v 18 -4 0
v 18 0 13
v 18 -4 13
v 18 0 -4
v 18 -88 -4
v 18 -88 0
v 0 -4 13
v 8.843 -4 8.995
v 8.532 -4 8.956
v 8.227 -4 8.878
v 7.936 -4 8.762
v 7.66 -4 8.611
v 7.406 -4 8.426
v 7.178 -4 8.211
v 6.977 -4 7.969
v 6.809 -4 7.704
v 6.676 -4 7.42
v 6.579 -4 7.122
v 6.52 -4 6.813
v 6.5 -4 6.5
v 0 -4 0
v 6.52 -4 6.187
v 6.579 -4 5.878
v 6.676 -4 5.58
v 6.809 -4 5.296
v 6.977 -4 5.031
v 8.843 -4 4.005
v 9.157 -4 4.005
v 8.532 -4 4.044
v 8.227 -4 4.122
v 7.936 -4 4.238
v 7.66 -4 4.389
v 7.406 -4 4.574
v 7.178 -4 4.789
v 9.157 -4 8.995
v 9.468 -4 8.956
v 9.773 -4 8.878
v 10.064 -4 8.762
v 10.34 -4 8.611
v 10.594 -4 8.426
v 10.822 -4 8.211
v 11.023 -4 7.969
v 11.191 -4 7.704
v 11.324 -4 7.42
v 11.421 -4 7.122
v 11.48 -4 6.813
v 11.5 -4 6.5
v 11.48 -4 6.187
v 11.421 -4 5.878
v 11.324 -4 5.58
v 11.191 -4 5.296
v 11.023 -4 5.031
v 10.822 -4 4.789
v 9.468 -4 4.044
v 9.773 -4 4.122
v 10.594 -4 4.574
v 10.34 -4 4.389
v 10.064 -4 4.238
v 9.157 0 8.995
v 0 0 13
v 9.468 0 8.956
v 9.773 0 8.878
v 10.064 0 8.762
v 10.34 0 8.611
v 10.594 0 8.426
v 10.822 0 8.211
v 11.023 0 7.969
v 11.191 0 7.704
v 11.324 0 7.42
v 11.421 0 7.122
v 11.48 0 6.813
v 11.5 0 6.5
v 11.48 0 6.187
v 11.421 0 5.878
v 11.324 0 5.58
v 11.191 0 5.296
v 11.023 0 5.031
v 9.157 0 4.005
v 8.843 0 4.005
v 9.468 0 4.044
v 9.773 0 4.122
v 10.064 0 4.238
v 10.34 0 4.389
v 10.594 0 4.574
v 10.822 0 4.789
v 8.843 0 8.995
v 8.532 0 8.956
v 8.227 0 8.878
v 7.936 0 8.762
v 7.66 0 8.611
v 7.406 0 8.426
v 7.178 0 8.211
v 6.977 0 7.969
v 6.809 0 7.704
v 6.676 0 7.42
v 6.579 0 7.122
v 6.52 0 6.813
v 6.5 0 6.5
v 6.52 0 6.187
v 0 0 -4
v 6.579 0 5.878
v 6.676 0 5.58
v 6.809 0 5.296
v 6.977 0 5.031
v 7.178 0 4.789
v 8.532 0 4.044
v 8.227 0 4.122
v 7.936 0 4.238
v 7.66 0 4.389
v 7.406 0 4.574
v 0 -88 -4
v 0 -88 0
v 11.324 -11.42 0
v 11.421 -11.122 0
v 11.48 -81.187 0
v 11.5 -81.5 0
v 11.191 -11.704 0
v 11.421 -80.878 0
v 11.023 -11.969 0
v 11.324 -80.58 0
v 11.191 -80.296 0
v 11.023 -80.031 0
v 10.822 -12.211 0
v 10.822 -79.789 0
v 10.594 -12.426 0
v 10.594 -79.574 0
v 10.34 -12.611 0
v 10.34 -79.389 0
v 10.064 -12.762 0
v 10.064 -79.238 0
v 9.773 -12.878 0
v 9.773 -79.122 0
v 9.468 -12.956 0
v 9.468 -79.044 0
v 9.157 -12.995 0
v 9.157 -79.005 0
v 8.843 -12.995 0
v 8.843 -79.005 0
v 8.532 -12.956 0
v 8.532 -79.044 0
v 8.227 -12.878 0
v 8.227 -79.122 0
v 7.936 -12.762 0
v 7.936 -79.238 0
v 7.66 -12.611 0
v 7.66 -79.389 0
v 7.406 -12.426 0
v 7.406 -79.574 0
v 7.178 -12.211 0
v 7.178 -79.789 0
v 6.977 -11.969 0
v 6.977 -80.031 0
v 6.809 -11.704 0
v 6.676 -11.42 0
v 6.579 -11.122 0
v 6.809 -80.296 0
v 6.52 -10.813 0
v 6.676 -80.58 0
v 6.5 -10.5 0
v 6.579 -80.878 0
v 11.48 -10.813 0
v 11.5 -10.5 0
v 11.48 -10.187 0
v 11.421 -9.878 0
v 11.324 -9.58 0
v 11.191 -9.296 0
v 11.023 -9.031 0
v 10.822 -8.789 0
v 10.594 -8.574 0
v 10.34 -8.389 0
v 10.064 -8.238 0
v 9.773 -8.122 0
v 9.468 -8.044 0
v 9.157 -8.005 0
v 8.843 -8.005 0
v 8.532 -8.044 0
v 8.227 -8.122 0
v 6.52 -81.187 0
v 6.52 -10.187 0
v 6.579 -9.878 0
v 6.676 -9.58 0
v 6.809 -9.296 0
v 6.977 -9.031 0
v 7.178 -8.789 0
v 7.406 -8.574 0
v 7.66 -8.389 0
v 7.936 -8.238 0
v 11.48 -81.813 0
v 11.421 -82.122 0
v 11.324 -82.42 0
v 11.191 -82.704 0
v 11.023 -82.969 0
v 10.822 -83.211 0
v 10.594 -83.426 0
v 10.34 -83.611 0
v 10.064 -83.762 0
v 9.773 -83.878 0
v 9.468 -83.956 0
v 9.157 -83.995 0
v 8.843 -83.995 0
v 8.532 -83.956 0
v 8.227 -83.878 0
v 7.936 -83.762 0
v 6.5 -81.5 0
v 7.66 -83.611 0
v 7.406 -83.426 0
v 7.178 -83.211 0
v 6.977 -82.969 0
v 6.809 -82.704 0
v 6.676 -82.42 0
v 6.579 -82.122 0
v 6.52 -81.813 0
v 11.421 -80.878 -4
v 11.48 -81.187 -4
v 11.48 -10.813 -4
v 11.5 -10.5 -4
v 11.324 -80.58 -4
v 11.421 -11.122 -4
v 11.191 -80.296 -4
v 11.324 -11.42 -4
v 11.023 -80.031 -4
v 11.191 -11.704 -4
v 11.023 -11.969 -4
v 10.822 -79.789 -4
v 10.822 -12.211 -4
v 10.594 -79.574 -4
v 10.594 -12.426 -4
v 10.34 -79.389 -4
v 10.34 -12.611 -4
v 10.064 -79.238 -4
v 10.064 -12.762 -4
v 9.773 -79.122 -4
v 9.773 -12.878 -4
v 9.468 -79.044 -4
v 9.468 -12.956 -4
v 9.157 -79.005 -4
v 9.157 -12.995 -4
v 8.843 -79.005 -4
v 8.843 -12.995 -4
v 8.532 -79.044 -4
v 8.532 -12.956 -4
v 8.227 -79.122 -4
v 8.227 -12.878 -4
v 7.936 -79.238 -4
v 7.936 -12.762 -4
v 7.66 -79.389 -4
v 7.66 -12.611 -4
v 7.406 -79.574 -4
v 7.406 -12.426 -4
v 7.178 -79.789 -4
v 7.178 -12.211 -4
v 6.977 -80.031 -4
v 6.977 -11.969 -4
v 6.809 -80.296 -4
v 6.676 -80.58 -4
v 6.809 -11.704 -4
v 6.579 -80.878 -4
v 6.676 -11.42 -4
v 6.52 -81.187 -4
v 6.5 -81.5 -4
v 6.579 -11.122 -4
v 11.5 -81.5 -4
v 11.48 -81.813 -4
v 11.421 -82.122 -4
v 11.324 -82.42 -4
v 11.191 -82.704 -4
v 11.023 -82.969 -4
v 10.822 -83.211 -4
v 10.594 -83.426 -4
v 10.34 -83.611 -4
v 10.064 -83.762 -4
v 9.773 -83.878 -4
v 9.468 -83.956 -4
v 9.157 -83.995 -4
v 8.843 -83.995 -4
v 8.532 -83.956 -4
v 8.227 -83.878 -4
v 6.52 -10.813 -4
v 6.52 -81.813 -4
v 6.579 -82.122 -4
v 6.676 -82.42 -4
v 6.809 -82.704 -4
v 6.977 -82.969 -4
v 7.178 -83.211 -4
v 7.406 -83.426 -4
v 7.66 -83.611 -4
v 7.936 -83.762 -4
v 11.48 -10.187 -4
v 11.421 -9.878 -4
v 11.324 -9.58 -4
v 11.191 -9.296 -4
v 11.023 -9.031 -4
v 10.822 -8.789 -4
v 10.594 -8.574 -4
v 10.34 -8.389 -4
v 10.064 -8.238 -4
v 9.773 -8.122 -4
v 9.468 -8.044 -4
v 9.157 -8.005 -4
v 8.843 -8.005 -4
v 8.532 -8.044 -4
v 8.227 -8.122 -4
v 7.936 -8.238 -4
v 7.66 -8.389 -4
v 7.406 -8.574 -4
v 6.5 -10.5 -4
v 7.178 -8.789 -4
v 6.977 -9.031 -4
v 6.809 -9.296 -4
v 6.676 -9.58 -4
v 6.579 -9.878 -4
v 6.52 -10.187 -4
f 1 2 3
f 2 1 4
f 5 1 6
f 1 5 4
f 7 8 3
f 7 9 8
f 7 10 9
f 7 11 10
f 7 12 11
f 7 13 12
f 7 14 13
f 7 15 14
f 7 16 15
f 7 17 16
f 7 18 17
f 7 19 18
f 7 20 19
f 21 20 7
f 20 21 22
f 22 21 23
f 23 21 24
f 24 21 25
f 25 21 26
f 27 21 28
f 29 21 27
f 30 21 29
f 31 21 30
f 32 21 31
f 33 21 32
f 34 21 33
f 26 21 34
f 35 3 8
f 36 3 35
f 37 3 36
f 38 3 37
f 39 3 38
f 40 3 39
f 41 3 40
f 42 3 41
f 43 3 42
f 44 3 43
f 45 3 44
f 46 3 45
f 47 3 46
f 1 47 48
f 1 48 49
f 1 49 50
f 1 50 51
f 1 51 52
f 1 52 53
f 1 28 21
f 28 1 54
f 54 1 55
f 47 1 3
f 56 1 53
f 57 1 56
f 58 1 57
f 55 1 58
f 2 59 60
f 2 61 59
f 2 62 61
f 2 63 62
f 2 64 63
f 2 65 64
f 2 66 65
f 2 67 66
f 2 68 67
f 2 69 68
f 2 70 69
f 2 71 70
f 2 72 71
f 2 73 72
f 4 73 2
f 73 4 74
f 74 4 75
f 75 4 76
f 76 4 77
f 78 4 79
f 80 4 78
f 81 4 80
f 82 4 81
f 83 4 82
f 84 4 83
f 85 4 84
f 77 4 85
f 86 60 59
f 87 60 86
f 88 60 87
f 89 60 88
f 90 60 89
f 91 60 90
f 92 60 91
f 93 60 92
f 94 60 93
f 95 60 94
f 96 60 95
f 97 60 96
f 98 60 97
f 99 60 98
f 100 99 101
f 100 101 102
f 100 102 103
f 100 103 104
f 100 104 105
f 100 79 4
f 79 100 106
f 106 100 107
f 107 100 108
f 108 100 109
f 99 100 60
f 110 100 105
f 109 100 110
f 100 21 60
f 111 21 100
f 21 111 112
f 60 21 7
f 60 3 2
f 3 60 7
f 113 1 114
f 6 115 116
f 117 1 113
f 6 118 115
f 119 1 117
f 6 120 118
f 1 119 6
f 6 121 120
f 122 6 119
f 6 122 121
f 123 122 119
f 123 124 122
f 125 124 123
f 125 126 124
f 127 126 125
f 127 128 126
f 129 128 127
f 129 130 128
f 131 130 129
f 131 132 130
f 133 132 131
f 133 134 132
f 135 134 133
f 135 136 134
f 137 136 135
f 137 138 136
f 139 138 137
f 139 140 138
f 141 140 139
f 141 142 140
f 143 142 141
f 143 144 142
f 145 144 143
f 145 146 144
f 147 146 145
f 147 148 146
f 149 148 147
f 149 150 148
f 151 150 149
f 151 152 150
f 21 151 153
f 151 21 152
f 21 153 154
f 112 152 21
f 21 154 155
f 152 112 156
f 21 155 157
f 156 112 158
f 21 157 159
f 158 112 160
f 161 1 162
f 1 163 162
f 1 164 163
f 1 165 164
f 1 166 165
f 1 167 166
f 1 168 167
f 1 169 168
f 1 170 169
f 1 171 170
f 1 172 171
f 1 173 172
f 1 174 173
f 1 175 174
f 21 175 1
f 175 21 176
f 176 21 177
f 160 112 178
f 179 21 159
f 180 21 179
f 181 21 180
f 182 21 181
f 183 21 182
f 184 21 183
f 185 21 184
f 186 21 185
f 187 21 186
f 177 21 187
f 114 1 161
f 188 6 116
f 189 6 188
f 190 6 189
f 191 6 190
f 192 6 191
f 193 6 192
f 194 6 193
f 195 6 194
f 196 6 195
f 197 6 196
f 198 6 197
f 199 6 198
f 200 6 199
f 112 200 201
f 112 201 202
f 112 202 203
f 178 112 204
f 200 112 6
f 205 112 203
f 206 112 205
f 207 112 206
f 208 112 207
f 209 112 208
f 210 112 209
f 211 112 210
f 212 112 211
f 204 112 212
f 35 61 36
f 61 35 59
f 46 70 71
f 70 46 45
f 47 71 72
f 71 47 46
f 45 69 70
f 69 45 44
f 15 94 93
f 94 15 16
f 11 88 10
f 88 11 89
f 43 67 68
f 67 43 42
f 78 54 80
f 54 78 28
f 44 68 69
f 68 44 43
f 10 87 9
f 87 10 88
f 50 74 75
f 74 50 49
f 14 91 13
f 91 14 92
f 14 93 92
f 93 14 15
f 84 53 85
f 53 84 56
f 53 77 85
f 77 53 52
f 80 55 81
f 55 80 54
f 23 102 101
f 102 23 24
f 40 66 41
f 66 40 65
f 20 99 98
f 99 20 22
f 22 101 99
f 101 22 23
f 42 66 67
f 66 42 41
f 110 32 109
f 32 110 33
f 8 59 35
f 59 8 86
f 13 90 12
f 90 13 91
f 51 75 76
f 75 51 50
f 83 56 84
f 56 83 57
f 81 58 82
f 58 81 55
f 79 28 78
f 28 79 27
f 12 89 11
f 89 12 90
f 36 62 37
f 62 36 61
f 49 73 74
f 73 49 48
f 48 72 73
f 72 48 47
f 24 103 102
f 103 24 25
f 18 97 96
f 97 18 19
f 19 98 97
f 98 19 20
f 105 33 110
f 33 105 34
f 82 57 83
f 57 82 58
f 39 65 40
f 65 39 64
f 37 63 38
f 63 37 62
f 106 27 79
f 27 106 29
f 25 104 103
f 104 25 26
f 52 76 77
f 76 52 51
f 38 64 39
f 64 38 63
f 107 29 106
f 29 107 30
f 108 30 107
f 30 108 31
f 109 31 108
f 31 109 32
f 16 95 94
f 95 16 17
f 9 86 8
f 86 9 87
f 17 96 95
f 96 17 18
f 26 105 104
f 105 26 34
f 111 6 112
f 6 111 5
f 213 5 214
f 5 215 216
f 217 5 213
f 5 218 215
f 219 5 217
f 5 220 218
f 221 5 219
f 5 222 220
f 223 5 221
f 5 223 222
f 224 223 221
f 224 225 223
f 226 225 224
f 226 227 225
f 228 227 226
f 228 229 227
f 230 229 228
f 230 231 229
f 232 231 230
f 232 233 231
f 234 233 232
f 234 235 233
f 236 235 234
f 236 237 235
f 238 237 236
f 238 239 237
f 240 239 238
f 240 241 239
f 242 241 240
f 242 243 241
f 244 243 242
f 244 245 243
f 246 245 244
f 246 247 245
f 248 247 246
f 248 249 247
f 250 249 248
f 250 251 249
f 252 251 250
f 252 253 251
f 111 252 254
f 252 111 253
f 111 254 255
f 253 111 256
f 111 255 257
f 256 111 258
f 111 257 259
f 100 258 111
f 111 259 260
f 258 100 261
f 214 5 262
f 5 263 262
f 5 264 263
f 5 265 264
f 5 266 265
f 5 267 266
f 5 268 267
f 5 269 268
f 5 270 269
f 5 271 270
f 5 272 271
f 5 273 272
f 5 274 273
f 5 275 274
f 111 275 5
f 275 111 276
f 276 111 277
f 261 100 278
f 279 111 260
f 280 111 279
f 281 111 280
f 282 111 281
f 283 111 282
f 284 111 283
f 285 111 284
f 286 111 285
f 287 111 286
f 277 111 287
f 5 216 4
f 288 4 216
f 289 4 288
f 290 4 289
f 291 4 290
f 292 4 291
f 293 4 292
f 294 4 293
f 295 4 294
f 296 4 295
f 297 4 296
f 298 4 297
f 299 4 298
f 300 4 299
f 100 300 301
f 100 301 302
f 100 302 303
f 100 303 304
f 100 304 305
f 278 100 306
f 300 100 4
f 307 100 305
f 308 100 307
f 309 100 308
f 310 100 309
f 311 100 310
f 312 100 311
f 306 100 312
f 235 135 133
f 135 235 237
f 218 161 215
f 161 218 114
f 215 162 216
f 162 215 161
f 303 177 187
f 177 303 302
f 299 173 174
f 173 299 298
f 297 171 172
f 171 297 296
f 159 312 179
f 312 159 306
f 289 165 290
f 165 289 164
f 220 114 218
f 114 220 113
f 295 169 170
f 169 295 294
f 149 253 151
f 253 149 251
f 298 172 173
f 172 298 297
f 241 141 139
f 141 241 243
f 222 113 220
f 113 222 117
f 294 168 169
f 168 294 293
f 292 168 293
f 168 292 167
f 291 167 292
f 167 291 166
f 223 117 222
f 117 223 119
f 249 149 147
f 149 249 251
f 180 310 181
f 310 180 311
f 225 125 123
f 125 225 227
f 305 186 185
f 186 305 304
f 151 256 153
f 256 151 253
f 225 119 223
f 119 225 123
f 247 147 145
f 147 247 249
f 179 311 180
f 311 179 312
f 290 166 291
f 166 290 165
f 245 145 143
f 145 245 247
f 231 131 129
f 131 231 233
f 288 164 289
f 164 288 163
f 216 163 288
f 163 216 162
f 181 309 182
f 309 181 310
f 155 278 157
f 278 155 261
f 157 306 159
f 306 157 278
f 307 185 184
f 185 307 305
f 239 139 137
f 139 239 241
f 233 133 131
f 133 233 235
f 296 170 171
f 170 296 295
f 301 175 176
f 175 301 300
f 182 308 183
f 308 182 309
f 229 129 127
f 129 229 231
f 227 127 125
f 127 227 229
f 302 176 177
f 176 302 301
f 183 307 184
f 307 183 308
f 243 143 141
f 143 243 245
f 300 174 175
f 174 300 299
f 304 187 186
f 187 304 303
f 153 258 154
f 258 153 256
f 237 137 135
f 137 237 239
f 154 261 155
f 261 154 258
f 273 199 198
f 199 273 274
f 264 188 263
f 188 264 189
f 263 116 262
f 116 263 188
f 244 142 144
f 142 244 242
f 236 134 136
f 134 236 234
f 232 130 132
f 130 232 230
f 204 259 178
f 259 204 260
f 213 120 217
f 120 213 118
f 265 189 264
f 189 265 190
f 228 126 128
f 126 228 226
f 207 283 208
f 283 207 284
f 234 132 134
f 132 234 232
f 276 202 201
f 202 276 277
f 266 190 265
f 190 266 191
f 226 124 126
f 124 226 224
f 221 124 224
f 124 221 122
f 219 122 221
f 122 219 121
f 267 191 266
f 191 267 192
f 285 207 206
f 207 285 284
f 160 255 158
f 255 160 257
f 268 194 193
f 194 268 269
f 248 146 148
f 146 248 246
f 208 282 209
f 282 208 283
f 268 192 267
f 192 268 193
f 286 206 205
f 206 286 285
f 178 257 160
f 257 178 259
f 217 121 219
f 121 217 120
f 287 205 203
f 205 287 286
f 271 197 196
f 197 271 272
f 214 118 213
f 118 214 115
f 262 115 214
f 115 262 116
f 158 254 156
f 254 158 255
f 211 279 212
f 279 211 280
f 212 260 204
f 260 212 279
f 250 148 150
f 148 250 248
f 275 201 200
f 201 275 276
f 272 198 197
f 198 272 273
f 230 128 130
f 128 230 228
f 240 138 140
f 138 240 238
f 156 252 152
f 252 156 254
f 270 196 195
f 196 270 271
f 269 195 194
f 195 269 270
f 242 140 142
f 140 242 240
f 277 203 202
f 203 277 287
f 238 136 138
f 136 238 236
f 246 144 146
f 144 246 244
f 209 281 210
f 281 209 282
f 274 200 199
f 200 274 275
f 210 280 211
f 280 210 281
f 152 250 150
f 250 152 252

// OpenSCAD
/*
 * file: i3-fan-mount-v2.scad
 * author: gregor binder <gregor_reprap@catrix.at>
 * date: 12.11.2013
 * last change: 12.11.2013
 * license: CC BY-NC-SA 3.0
 * changelog:
 *	- created a second hole to mount the fan
 */

hole=5;
thickness=4;
width=hole+thickness+thickness+5;
lenght=hole+thickness+thickness;
holedistance=71;
lenghtfanmount=holedistance+hole+(thickness*3);
$fn=50;

rotate([90,0,0])
union() {
difference() {
	cube([width,lenght,thickness]);
	translate([width/2,lenght/2,-0.5])
		cylinder(h=thickness+1,r=hole/2);
}
difference() {
	translate([0,-thickness,0])
		cube([width,thickness,lenghtfanmount]);
	translate([width/2,0.5,lenght/2+thickness])
		rotate([90,0,0])
			cylinder(h=thickness+1,r=hole/2);
	translate([width/2,0.5,(lenght/2+thickness)+holedistance])
		rotate([90,0,0])
			cylinder(h=thickness+1,r=hole/2);
}
}
